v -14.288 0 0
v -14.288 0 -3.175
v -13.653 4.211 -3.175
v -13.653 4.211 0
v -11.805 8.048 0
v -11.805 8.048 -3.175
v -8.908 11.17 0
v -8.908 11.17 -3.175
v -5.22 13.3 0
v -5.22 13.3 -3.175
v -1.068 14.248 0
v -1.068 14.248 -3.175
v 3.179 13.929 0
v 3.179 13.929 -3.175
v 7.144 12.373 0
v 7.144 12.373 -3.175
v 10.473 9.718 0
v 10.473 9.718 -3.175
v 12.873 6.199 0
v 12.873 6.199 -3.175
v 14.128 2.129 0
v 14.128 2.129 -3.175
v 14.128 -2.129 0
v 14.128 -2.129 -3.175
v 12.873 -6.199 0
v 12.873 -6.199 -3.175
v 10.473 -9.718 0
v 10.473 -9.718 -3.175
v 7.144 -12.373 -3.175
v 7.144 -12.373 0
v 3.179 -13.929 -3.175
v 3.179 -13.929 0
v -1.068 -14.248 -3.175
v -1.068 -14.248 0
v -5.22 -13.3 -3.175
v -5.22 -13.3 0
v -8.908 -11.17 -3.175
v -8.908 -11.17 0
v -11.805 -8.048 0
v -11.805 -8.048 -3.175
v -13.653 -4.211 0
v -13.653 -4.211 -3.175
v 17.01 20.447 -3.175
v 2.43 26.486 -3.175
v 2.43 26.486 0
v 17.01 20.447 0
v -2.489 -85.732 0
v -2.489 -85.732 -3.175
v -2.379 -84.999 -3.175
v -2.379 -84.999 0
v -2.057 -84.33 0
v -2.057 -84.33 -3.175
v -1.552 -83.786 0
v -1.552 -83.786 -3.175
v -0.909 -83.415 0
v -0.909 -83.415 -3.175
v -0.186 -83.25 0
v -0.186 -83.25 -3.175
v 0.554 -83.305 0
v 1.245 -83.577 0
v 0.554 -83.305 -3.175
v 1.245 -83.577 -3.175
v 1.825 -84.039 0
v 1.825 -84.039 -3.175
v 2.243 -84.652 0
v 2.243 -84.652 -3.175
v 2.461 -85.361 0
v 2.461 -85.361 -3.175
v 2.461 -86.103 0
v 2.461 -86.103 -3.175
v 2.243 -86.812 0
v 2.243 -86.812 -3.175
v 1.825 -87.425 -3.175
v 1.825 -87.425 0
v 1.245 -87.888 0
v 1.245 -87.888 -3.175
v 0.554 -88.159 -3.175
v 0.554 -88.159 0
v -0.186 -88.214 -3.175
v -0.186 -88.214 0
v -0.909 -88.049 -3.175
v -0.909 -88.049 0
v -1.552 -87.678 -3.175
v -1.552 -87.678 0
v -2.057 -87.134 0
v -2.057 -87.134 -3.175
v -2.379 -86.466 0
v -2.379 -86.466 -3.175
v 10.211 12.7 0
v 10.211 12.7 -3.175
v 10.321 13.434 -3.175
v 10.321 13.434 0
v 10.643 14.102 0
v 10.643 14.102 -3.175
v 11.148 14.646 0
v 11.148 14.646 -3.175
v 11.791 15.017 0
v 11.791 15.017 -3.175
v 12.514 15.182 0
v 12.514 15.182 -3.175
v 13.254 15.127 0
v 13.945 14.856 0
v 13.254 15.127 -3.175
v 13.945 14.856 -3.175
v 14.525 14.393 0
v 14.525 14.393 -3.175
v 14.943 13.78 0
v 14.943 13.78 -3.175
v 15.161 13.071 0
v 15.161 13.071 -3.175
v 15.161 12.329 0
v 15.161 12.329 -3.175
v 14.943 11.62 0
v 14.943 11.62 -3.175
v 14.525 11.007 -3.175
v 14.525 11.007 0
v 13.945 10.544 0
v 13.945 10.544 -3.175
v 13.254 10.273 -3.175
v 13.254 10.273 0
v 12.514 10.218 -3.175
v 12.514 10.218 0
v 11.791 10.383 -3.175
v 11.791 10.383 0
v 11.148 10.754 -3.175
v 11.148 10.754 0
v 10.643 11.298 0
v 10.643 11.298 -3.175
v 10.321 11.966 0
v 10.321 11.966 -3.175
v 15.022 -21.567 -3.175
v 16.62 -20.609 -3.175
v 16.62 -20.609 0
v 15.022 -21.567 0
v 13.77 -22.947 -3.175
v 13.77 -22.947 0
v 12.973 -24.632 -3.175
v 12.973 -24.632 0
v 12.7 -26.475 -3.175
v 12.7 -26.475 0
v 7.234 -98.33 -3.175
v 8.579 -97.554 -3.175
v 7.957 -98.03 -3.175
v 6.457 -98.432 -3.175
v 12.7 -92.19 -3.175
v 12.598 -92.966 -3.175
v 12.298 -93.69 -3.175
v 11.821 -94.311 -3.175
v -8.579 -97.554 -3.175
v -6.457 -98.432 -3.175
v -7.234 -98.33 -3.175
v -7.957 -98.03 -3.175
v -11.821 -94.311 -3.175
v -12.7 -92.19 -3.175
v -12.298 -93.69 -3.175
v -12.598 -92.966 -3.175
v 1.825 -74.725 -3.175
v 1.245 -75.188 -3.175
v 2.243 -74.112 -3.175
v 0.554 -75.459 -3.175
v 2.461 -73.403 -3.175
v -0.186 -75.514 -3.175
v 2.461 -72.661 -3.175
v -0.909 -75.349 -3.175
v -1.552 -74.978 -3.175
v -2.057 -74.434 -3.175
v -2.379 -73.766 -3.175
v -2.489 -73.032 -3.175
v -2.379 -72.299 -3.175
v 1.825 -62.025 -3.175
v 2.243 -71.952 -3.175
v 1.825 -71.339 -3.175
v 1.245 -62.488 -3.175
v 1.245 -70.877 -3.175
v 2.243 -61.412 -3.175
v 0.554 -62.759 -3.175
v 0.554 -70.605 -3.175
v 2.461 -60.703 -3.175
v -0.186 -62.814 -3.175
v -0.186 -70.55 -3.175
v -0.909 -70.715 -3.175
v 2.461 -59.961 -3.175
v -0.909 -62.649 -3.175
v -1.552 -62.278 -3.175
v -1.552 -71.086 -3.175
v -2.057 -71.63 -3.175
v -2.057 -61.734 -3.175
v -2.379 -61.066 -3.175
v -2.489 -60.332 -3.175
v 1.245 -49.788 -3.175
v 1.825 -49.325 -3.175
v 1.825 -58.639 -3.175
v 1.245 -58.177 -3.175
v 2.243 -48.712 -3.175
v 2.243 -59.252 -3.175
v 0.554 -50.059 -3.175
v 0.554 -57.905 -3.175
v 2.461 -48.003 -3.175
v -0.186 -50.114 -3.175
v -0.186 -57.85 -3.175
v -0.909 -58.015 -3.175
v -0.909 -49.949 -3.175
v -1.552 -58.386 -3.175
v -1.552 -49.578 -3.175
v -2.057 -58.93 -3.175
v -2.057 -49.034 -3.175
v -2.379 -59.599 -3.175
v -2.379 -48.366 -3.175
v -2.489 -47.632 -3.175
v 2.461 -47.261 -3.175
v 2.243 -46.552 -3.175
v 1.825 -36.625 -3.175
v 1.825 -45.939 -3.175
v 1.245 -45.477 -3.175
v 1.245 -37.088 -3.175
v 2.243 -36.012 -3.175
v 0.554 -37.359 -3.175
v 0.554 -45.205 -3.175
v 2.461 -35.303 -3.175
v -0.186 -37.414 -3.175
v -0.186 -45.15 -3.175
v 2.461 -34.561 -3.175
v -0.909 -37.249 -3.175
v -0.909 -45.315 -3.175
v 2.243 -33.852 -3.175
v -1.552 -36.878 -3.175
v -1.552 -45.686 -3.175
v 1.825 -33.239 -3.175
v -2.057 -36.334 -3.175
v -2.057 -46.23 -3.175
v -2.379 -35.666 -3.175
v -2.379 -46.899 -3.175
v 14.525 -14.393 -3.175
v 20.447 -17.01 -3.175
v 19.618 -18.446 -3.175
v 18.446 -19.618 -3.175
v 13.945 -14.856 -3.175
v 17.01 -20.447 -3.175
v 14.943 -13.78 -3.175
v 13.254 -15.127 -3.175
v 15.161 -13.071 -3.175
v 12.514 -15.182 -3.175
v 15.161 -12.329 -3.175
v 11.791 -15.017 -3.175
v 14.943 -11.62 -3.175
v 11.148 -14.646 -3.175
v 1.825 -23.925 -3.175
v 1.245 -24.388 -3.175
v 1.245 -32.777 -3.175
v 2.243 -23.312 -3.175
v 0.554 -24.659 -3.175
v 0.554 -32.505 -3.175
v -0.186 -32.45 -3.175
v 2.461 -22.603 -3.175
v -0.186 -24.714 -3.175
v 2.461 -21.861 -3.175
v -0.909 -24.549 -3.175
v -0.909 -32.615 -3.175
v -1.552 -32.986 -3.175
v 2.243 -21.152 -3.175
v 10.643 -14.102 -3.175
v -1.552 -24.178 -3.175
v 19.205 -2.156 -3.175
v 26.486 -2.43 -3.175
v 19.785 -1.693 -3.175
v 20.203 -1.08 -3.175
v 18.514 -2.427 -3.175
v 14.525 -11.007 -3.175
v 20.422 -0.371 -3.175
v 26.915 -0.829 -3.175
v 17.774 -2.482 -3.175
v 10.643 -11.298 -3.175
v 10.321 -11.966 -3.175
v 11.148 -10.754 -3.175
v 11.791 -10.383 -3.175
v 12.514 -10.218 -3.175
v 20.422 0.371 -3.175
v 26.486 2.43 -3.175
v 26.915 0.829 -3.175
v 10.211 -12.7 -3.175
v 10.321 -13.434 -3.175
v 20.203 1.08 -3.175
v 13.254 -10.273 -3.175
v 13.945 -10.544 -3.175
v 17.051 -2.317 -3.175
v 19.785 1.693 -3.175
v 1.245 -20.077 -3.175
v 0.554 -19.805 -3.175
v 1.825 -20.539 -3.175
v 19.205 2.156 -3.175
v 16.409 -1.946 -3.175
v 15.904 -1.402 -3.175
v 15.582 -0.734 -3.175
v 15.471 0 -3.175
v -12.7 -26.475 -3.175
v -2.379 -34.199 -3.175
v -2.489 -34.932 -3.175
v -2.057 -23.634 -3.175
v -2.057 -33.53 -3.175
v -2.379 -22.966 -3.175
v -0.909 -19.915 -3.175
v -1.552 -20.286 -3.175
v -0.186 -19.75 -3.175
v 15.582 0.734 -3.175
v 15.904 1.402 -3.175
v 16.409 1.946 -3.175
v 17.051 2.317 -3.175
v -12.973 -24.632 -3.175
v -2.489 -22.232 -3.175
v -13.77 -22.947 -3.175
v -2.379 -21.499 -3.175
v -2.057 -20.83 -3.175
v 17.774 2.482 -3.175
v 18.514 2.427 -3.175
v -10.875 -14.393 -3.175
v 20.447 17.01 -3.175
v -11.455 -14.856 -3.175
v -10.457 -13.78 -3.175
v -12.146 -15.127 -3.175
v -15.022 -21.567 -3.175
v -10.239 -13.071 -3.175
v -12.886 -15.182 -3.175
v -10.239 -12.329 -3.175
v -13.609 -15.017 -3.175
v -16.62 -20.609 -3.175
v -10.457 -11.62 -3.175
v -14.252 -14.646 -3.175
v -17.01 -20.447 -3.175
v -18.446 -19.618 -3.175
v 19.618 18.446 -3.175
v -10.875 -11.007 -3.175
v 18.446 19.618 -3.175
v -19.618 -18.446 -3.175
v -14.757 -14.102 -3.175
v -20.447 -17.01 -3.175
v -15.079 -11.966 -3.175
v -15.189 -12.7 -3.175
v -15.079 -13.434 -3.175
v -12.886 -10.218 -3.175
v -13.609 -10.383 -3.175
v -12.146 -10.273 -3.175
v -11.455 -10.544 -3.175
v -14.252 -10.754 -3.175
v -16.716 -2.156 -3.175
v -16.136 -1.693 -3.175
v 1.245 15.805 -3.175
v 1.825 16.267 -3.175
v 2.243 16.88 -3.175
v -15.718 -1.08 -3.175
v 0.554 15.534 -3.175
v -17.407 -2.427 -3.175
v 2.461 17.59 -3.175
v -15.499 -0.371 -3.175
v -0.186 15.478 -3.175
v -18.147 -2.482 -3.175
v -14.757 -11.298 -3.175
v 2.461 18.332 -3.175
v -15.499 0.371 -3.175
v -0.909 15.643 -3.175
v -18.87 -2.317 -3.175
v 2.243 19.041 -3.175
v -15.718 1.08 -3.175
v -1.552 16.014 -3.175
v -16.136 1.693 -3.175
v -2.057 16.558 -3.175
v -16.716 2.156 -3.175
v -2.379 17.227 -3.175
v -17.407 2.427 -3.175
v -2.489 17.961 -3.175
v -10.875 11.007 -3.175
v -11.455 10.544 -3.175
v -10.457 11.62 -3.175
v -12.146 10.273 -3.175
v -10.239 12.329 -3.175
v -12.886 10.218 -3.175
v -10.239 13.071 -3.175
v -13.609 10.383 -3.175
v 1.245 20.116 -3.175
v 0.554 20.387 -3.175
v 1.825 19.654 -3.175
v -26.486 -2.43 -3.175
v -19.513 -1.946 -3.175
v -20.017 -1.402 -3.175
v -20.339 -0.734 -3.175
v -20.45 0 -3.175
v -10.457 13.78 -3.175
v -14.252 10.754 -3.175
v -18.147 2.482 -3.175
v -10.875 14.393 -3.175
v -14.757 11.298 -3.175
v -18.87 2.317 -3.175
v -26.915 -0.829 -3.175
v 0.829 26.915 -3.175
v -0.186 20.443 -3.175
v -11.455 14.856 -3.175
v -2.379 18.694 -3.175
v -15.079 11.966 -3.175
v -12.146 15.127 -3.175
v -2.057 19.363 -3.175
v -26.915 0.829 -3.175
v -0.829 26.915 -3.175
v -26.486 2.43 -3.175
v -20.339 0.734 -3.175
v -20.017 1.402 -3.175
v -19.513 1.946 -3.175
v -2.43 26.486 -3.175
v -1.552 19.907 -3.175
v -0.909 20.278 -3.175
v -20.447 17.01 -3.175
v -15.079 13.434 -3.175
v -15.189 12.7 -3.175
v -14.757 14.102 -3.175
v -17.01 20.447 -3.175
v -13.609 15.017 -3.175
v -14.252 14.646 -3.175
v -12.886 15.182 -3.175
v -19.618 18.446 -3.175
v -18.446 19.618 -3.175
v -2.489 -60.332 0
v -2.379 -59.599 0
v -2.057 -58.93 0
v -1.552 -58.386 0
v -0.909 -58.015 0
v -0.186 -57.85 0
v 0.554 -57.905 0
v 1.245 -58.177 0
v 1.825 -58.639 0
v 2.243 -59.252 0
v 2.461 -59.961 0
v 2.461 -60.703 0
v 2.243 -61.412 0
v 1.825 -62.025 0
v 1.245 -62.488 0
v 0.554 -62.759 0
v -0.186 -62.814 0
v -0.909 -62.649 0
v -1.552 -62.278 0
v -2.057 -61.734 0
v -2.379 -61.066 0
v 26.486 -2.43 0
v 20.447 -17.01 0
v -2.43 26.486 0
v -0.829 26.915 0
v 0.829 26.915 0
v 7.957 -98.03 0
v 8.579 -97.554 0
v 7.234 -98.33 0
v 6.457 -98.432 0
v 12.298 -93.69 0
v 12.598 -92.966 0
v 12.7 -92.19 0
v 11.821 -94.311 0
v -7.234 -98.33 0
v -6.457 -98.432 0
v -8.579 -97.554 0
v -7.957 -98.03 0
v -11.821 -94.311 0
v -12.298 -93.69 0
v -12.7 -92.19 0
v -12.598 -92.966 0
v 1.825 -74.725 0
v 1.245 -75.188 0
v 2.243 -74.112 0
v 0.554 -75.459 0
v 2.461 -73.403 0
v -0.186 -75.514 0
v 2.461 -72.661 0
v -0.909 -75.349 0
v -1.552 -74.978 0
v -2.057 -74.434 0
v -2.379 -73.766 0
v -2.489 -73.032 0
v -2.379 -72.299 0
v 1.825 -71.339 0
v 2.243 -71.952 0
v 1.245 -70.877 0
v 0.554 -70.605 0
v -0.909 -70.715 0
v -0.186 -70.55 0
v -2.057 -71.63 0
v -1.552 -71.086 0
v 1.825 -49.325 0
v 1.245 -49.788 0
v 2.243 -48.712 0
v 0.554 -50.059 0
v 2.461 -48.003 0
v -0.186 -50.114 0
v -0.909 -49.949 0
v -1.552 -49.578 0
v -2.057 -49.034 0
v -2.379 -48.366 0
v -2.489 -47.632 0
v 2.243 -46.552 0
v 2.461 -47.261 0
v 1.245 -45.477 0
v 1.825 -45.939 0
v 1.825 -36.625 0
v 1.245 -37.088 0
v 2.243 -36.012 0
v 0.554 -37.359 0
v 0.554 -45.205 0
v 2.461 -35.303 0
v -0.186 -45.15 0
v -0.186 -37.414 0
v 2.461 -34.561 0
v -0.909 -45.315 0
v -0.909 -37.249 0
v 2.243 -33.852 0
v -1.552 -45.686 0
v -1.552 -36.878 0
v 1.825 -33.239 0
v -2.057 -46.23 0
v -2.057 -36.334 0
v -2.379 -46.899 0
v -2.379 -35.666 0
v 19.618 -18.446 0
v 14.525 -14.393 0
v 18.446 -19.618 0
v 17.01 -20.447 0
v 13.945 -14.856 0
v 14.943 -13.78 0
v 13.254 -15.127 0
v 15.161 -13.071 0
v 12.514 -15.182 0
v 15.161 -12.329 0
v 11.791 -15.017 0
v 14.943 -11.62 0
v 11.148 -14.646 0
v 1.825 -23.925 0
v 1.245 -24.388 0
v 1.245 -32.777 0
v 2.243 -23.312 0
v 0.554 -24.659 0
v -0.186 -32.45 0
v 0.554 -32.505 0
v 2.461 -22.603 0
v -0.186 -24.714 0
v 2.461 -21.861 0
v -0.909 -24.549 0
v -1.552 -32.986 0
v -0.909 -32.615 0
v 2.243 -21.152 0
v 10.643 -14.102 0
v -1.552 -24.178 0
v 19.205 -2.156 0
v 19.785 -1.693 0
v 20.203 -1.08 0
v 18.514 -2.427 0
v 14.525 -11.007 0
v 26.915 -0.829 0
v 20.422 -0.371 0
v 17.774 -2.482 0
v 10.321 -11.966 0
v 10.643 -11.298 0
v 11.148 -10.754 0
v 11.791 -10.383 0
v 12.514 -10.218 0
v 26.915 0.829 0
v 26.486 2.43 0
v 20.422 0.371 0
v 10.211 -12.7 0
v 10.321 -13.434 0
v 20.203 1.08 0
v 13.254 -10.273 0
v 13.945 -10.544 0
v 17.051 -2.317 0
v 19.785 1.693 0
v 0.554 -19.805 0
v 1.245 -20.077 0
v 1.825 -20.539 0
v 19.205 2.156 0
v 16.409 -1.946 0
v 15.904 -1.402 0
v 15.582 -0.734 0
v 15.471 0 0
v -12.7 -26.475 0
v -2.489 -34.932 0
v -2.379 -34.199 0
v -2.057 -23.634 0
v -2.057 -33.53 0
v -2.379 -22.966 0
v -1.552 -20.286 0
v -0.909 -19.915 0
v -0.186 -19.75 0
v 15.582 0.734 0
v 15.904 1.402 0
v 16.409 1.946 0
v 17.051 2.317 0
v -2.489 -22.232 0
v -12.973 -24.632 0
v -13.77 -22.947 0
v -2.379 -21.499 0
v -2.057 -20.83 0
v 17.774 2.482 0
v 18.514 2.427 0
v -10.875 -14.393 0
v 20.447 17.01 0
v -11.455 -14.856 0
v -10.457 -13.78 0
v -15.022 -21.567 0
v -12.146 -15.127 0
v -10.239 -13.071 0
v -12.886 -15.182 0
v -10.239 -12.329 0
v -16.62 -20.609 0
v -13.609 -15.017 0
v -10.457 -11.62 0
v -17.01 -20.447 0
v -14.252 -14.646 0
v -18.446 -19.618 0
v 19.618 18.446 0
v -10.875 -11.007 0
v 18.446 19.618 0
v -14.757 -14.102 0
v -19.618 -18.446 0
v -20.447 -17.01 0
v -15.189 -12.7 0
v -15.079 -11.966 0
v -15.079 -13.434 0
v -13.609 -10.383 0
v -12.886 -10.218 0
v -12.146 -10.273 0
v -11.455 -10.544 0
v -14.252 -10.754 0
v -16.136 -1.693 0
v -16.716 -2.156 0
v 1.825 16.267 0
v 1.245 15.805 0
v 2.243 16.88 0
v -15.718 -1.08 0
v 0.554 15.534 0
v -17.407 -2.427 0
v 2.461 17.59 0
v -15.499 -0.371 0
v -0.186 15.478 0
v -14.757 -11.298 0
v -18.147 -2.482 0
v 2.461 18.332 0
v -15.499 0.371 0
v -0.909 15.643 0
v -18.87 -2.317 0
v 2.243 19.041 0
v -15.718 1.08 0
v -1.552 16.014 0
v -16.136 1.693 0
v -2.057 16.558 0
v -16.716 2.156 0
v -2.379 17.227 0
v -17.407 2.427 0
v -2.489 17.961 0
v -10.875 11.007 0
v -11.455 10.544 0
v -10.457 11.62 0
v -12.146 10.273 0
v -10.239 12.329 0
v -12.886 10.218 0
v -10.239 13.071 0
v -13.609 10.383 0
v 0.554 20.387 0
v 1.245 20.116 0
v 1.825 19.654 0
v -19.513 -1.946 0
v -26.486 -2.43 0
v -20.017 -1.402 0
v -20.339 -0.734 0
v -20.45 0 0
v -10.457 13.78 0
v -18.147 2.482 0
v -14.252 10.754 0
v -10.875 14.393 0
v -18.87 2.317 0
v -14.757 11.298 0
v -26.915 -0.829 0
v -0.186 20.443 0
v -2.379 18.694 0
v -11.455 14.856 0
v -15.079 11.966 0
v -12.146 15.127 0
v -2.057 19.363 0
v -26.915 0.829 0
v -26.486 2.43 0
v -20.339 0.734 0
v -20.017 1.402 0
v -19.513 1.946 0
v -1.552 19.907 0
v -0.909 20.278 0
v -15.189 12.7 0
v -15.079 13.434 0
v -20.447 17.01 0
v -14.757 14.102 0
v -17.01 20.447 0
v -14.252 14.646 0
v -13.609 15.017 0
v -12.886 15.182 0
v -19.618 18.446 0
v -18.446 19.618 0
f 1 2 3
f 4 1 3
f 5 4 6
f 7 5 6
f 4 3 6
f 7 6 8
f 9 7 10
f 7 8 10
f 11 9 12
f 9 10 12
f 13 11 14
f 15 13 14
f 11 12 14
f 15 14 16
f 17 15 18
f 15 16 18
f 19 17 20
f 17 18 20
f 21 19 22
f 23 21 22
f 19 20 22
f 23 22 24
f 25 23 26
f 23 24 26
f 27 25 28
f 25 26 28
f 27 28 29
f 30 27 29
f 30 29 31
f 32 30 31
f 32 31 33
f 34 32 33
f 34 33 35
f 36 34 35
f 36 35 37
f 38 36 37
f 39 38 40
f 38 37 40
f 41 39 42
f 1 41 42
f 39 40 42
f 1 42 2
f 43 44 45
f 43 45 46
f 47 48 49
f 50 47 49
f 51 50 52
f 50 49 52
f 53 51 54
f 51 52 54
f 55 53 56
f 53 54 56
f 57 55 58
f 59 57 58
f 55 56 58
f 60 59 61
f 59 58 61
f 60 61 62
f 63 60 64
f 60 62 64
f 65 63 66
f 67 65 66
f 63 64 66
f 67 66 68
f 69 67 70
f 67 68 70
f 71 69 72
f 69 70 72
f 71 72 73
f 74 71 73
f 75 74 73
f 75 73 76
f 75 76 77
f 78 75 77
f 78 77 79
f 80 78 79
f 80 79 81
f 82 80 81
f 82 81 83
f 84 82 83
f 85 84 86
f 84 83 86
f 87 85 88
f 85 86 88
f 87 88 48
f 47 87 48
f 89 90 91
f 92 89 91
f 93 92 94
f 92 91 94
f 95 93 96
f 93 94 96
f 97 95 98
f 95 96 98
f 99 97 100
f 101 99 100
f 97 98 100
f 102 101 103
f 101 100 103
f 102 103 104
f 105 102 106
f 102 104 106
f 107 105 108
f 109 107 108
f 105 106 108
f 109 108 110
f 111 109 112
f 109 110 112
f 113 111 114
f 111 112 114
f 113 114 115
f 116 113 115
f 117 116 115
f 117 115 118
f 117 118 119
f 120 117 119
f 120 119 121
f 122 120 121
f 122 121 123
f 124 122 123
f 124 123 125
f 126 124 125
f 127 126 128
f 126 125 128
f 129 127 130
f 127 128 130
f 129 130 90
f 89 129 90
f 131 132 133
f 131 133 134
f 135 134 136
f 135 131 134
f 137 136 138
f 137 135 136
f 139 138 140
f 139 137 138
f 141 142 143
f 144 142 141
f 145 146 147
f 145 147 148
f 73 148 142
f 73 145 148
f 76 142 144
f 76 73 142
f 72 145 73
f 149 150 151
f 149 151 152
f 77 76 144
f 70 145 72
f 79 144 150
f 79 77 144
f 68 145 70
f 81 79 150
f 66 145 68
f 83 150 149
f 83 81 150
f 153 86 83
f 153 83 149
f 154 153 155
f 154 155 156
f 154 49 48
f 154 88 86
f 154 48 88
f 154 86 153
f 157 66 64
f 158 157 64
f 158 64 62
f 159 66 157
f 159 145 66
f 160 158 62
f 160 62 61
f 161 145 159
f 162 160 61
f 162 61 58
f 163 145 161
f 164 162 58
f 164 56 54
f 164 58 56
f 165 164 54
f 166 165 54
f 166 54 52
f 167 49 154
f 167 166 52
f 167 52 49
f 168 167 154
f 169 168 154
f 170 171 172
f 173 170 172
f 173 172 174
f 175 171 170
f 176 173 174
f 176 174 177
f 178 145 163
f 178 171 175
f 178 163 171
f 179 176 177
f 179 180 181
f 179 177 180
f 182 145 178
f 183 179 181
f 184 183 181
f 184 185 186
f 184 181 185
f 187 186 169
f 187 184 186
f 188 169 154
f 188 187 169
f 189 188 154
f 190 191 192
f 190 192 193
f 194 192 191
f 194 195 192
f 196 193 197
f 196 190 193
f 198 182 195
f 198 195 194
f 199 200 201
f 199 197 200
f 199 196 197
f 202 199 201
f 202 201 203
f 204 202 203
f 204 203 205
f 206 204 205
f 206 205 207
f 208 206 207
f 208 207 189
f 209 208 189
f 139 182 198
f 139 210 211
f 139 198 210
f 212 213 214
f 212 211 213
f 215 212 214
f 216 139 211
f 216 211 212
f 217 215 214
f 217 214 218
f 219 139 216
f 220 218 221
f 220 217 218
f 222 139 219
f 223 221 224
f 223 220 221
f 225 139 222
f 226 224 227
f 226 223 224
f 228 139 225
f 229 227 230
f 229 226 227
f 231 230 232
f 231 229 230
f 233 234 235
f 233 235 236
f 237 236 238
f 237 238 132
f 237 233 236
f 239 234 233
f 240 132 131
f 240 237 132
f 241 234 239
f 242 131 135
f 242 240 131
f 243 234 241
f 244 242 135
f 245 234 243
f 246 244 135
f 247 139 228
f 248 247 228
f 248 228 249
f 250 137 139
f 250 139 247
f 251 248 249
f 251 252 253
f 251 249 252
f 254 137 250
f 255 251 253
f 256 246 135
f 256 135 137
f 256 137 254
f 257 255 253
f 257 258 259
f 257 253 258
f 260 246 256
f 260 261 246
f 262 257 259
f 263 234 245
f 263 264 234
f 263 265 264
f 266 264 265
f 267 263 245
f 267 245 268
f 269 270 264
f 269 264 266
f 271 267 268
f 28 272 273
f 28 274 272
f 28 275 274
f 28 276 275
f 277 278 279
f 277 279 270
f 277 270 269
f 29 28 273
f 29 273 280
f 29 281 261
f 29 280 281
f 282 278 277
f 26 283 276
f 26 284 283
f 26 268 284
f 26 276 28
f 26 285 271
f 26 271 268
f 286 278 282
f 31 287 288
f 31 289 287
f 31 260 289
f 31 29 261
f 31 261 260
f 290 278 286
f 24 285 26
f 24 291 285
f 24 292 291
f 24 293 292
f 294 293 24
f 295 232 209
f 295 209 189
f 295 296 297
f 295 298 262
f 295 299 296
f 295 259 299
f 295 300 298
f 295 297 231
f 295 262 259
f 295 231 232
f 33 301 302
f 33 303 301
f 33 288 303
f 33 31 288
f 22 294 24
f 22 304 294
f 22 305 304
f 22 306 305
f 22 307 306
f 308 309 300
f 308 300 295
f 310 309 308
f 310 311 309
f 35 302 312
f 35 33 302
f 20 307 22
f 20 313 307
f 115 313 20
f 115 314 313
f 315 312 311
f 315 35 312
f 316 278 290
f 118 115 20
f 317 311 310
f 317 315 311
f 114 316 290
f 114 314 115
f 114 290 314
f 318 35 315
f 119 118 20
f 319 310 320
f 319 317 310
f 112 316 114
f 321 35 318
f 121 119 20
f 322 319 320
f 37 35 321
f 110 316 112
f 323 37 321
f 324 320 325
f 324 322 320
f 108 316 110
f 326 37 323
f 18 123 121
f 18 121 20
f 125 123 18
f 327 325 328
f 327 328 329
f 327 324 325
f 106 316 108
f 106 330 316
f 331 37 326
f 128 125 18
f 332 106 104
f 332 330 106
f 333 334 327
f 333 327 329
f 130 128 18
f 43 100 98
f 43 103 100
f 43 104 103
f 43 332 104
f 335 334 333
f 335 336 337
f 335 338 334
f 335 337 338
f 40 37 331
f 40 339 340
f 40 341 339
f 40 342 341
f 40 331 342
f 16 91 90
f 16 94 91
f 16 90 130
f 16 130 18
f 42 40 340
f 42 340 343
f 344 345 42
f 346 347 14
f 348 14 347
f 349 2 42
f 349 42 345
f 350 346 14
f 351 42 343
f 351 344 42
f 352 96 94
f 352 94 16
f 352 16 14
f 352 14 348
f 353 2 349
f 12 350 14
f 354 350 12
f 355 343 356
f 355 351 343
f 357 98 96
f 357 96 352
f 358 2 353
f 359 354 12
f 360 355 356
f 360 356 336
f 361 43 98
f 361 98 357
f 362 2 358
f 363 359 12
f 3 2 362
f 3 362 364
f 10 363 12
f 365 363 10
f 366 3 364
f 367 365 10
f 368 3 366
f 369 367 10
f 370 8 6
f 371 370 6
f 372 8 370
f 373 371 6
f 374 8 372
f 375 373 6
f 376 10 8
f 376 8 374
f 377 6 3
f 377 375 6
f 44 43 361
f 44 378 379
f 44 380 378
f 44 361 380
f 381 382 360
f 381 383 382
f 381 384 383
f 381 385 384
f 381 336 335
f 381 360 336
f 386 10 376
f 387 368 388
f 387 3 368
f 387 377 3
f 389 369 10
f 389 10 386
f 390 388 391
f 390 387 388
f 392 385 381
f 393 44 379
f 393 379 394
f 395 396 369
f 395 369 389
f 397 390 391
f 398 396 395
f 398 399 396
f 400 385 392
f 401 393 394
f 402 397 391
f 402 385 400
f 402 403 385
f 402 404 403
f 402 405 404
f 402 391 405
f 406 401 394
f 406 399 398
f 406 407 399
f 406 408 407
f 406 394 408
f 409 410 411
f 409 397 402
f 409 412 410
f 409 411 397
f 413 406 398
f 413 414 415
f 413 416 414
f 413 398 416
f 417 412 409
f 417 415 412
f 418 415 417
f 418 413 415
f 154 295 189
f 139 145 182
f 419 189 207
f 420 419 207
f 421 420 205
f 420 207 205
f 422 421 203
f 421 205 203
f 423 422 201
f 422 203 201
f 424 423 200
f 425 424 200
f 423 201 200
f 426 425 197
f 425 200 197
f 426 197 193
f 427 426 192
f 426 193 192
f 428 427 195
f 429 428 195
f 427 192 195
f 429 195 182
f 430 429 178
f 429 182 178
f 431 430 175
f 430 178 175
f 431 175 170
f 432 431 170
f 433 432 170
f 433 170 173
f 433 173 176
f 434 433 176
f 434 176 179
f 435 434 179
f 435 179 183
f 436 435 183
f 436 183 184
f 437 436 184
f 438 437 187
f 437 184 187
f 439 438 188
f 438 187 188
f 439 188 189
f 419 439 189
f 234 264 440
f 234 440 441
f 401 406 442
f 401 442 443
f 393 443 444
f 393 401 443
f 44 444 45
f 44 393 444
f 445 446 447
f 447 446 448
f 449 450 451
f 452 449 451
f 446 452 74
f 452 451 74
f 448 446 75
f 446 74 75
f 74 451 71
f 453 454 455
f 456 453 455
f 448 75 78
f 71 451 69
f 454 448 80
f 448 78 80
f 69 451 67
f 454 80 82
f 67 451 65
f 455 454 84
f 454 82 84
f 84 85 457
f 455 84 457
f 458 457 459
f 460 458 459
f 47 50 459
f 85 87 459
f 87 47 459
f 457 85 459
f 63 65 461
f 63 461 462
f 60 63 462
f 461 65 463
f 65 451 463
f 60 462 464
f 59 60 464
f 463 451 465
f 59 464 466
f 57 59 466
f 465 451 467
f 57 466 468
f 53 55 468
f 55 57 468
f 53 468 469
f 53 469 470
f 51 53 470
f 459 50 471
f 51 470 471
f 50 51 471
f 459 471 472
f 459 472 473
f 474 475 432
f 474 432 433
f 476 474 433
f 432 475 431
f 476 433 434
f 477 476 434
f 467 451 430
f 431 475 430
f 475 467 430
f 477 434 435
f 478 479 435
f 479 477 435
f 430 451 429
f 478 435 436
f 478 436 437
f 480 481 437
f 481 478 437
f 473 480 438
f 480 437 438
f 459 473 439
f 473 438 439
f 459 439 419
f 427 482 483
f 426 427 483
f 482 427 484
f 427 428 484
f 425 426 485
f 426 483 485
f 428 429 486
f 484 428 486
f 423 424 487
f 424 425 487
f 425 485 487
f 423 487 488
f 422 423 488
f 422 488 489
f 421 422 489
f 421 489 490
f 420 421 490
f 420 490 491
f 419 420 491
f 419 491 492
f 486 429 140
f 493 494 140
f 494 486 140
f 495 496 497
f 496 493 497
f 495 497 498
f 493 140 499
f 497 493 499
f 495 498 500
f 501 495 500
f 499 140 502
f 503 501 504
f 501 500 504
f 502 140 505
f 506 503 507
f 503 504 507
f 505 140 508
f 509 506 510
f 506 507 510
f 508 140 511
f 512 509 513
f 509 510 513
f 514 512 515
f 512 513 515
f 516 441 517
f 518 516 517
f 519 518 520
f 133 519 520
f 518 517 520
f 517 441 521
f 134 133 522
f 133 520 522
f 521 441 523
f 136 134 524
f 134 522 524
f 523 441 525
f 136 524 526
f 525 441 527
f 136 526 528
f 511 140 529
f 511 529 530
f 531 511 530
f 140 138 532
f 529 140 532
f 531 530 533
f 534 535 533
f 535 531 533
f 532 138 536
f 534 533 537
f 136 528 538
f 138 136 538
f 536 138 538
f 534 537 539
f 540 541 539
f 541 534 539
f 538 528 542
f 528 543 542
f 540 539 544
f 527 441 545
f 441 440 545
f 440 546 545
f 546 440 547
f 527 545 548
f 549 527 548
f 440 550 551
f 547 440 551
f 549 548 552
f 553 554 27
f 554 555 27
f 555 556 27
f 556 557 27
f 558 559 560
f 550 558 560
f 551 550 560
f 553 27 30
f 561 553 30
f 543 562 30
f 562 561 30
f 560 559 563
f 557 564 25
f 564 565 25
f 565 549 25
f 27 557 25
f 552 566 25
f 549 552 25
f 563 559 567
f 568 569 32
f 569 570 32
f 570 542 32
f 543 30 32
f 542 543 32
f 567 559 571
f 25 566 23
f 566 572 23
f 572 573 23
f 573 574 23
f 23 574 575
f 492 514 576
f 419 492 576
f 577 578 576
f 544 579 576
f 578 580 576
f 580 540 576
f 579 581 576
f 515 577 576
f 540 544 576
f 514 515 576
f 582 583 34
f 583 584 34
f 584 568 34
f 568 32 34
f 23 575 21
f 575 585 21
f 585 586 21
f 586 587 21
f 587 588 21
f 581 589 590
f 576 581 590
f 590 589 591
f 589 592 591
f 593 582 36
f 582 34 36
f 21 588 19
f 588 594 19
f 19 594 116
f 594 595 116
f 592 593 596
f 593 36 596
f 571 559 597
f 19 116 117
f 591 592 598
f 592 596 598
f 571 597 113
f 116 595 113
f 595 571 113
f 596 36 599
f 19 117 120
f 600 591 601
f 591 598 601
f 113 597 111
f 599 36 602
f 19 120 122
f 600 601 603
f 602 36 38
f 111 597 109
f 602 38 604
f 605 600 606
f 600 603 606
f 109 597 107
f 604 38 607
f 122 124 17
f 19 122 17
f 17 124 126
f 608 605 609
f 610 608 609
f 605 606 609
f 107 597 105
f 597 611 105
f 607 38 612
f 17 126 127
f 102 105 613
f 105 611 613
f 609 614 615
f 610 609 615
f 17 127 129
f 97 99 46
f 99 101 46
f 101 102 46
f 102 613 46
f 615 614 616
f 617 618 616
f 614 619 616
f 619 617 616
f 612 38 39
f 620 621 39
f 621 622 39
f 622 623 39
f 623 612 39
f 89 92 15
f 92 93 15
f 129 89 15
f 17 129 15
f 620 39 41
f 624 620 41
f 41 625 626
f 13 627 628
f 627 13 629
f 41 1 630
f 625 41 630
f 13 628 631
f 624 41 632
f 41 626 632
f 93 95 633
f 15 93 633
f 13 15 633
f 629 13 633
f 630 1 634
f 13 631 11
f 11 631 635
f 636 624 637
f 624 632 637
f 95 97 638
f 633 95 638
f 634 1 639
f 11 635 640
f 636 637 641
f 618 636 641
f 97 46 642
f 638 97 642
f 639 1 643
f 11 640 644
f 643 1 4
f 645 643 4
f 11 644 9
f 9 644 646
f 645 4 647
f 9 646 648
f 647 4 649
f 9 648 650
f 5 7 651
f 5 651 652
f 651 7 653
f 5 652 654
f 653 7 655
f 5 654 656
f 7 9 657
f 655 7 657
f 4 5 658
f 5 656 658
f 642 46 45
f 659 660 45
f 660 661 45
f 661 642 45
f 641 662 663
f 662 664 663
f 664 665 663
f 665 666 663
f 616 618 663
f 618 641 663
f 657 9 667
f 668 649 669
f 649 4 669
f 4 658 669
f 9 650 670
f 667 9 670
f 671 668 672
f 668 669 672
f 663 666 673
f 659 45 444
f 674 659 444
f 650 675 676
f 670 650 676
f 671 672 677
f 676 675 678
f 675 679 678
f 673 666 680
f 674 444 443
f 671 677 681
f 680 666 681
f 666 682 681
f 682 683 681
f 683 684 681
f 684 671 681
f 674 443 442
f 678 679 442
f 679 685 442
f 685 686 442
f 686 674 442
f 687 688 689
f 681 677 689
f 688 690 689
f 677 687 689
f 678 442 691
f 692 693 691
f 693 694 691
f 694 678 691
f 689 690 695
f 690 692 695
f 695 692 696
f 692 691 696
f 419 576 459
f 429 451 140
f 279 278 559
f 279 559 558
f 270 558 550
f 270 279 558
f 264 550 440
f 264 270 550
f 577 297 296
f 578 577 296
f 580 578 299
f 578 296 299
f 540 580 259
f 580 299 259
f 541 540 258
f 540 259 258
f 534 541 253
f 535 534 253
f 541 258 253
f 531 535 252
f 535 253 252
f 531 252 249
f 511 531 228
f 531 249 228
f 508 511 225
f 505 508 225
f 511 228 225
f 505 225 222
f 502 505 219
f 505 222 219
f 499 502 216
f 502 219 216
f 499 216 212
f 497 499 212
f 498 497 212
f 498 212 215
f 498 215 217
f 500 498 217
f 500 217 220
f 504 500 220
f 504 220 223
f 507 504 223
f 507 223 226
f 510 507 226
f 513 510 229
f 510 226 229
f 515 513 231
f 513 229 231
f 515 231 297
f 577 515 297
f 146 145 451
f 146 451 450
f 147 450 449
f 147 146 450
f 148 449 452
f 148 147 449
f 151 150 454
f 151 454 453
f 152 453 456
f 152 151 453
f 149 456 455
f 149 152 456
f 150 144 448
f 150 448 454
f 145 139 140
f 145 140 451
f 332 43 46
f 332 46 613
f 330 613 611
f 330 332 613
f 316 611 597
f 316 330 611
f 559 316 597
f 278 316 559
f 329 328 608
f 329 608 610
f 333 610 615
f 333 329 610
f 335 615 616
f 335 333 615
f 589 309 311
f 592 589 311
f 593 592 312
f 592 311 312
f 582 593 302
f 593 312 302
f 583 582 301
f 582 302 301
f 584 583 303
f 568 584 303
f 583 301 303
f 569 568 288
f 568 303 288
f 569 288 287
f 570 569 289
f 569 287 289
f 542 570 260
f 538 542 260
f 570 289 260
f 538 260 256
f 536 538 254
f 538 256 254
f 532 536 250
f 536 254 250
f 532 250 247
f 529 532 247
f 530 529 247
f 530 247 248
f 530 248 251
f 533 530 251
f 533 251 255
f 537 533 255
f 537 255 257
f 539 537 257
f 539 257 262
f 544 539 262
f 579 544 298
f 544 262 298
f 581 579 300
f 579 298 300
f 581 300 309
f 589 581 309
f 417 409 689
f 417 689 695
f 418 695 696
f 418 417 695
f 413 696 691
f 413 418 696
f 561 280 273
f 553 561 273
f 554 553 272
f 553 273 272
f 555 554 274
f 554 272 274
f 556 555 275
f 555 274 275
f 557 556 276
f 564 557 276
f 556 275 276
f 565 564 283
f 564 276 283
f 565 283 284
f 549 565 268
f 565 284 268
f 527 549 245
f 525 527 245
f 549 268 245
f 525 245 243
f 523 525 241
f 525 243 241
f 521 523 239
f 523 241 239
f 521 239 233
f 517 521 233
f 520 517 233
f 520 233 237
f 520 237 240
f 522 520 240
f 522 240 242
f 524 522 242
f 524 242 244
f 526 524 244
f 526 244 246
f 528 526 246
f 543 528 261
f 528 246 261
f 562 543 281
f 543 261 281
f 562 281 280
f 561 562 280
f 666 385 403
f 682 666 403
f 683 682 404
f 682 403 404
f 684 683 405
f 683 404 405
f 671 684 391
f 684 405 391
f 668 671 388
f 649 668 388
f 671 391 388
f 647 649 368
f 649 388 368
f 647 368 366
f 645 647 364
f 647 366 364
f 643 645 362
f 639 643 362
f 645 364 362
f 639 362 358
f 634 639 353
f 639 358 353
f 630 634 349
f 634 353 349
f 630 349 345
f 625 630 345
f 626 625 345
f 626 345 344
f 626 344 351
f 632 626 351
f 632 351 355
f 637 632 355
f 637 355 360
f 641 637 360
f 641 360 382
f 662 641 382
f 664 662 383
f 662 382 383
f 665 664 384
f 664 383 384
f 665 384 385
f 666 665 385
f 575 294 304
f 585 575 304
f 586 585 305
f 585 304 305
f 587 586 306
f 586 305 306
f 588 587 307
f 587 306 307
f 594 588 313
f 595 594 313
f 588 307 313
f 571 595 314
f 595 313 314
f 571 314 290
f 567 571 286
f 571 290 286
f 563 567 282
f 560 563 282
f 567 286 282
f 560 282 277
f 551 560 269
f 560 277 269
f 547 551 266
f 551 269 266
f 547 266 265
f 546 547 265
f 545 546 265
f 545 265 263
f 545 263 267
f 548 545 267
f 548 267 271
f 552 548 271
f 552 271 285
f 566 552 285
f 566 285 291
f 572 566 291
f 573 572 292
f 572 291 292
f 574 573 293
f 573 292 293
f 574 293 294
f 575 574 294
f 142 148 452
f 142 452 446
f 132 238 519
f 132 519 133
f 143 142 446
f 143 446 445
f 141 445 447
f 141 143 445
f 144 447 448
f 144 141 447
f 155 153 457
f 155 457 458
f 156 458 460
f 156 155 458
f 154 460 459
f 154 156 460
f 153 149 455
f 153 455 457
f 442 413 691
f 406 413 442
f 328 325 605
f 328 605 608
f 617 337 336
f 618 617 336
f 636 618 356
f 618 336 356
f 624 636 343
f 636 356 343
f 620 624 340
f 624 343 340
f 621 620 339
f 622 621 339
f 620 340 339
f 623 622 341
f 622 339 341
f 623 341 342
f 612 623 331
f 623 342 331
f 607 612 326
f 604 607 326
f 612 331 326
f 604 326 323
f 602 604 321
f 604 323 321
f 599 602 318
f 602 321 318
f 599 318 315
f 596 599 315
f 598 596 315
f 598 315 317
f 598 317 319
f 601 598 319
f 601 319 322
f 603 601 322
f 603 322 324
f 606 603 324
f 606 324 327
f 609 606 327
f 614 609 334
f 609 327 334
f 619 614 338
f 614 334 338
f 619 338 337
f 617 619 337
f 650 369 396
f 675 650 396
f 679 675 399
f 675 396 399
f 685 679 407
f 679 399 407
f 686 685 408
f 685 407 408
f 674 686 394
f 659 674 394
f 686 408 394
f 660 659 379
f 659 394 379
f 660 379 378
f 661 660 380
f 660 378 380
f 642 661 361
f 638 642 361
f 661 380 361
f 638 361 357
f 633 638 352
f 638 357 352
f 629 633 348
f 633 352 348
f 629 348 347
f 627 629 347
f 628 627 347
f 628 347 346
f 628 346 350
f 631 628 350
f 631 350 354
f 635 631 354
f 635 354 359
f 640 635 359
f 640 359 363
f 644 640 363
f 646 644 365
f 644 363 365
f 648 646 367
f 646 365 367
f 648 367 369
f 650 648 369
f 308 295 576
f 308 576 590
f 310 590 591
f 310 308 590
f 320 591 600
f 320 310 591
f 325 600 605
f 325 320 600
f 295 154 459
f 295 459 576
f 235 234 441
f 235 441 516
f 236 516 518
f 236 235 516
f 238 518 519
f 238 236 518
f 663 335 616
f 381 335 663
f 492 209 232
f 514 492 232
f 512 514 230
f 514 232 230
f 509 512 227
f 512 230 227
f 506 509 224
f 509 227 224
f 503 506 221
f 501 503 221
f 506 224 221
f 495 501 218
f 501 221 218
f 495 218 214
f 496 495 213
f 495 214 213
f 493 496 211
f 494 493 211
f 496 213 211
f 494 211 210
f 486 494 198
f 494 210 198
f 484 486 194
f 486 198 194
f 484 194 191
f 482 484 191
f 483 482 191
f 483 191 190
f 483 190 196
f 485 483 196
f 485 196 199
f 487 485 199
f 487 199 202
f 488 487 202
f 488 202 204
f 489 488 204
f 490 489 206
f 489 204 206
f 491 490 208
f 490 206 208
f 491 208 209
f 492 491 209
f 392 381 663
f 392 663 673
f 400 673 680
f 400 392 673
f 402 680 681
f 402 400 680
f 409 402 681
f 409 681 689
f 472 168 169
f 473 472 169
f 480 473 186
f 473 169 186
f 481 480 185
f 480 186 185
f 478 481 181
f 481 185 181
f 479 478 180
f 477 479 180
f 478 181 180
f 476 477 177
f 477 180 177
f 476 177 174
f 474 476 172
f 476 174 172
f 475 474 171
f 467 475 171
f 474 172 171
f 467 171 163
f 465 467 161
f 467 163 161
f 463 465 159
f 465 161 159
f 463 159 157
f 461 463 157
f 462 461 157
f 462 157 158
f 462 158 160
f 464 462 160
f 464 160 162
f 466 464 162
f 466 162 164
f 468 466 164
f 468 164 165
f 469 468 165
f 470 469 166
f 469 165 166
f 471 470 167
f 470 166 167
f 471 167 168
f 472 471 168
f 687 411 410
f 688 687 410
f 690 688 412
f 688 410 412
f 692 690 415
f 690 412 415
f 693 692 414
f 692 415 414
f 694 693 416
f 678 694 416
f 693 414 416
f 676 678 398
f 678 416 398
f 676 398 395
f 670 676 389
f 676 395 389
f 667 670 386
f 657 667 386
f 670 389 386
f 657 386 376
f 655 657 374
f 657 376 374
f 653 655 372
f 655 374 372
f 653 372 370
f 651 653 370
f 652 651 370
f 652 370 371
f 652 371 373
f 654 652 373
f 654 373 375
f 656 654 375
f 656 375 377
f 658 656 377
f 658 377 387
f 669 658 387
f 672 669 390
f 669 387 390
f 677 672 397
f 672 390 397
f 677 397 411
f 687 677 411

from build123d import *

# Parameters (mm, degrees)
SKETCH1_R           = 2.4892
SKETCH1_R_2         = 14.2875
BOSS_EXTRUDE1_DEPTH = 3.175


with BuildPart() as part:
    # Sketch1 → Boss-Extrude1 (new body)
    with BuildSketch(Plane(origin=(0, 0, -3.175), x_dir=(-1, 0, 0), z_dir=(0, 0, -1))):
        with BuildLine():
            Line((8.578679656, -97.553569989), (11.821320344, -94.310929302))
            ThreePointArc((11.821320344, -94.310929302), (12.471638598, -93.337659255), (12.7, -92.189608958))
            Line((12.7, -92.189608958), (12.7, -26.475183996))
            ThreePointArc((12.7, -26.475183996), (13.770167962, -22.947313016), (16.619960204, -20.608548965))
            Line((16.619960204, -20.608548965), (17.010278569, -20.446873805))
            ThreePointArc((17.010278569, -20.446873805), (19.070366834, -19.070366834), (20.446873805, -17.010278569))
            Line((20.446873805, -17.010278569), (26.486206447, -2.430039796))
            ThreePointArc((26.486206447, -2.430039796), (26.969571416, 0), (26.486206447, 2.430039796))
            Line((26.486206447, 2.430039796), (20.446873805, 17.010278569))
            ThreePointArc((20.446873805, 17.010278569), (19.070366834, 19.070366834), (17.010278569, 20.446873805))
            Line((17.010278569, 20.446873805), (2.430039796, 26.486206447))
            ThreePointArc((2.430039796, 26.486206447), (0, 26.969571416), (-2.430039796, 26.486206447))
            Line((-2.430039796, 26.486206447), (-17.010278569, 20.446873805))
            ThreePointArc((-17.010278569, 20.446873805), (-19.070366834, 19.070366834), (-20.446873805, 17.010278569))
            Line((-20.446873805, 17.010278569), (-26.486206447, 2.430039796))
            ThreePointArc((-26.486206447, 2.430039796), (-26.969571416, 0), (-26.486206447, -2.430039796))
            Line((-26.486206447, -2.430039796), (-20.446873805, -17.010278569))
            ThreePointArc((-20.446873805, -17.010278569), (-19.070366834, -19.070366834), (-17.010278569, -20.446873805))
            Line((-17.010278569, -20.446873805), (-16.619960204, -20.608548965))
            ThreePointArc((-16.619960204, -20.608548965), (-13.770167962, -22.947313016), (-12.7, -26.475183996))
            Line((-12.7, -26.475183996), (-12.7, -92.189608958))
            ThreePointArc((-12.7, -92.189608958), (-12.471638598, -93.337659255), (-11.821320344, -94.310929302))
            Line((-11.821320344, -94.310929302), (-8.578679656, -97.553569989))
            ThreePointArc((-8.578679656, -97.553569989), (-7.60540961, -98.203888243), (-6.457359313, -98.432249645))
            Line((-6.457359313, -98.432249645), (6.457359313, -98.432249645))
            ThreePointArc((6.457359313, -98.432249645), (7.60540961, -98.203888243), (8.578679656, -97.553569989))
        make_face()
        with Locations((12.7, -12.7)):
            Circle(SKETCH1_R, mode=Mode.SUBTRACT)
        Circle(SKETCH1_R_2, mode=Mode.SUBTRACT)
        with Locations((-12.7, 12.7)):
            Circle(SKETCH1_R, mode=Mode.SUBTRACT)
        with Locations((-17.960512242, 0)):
            Circle(SKETCH1_R, mode=Mode.SUBTRACT)
        with Locations((-12.7, -12.7)):
            Circle(SKETCH1_R, mode=Mode.SUBTRACT)
        with Locations((12.7, 12.7)):
            Circle(SKETCH1_R, mode=Mode.SUBTRACT)
        with Locations((17.960512242, 0)):
            Circle(SKETCH1_R, mode=Mode.SUBTRACT)
        with Locations((0, 17.960512242)):
            Circle(SKETCH1_R, mode=Mode.SUBTRACT)
        with Locations((0, -22.232249645)):
            Circle(SKETCH1_R, mode=Mode.SUBTRACT)
        with Locations((0, -73.032249645)):
            Circle(SKETCH1_R, mode=Mode.SUBTRACT)
        with Locations((0, -47.632249645)):
            Circle(SKETCH1_R, mode=Mode.SUBTRACT)
        with Locations((0, -34.932249645)):
            Circle(SKETCH1_R, mode=Mode.SUBTRACT)
        with Locations((0, -60.332249645)):
            Circle(SKETCH1_R, mode=Mode.SUBTRACT)
        with Locations((0, -85.732249645)):
            Circle(SKETCH1_R, mode=Mode.SUBTRACT)
    extrude(amount=-BOSS_EXTRUDE1_DEPTH)


solid = part.part
